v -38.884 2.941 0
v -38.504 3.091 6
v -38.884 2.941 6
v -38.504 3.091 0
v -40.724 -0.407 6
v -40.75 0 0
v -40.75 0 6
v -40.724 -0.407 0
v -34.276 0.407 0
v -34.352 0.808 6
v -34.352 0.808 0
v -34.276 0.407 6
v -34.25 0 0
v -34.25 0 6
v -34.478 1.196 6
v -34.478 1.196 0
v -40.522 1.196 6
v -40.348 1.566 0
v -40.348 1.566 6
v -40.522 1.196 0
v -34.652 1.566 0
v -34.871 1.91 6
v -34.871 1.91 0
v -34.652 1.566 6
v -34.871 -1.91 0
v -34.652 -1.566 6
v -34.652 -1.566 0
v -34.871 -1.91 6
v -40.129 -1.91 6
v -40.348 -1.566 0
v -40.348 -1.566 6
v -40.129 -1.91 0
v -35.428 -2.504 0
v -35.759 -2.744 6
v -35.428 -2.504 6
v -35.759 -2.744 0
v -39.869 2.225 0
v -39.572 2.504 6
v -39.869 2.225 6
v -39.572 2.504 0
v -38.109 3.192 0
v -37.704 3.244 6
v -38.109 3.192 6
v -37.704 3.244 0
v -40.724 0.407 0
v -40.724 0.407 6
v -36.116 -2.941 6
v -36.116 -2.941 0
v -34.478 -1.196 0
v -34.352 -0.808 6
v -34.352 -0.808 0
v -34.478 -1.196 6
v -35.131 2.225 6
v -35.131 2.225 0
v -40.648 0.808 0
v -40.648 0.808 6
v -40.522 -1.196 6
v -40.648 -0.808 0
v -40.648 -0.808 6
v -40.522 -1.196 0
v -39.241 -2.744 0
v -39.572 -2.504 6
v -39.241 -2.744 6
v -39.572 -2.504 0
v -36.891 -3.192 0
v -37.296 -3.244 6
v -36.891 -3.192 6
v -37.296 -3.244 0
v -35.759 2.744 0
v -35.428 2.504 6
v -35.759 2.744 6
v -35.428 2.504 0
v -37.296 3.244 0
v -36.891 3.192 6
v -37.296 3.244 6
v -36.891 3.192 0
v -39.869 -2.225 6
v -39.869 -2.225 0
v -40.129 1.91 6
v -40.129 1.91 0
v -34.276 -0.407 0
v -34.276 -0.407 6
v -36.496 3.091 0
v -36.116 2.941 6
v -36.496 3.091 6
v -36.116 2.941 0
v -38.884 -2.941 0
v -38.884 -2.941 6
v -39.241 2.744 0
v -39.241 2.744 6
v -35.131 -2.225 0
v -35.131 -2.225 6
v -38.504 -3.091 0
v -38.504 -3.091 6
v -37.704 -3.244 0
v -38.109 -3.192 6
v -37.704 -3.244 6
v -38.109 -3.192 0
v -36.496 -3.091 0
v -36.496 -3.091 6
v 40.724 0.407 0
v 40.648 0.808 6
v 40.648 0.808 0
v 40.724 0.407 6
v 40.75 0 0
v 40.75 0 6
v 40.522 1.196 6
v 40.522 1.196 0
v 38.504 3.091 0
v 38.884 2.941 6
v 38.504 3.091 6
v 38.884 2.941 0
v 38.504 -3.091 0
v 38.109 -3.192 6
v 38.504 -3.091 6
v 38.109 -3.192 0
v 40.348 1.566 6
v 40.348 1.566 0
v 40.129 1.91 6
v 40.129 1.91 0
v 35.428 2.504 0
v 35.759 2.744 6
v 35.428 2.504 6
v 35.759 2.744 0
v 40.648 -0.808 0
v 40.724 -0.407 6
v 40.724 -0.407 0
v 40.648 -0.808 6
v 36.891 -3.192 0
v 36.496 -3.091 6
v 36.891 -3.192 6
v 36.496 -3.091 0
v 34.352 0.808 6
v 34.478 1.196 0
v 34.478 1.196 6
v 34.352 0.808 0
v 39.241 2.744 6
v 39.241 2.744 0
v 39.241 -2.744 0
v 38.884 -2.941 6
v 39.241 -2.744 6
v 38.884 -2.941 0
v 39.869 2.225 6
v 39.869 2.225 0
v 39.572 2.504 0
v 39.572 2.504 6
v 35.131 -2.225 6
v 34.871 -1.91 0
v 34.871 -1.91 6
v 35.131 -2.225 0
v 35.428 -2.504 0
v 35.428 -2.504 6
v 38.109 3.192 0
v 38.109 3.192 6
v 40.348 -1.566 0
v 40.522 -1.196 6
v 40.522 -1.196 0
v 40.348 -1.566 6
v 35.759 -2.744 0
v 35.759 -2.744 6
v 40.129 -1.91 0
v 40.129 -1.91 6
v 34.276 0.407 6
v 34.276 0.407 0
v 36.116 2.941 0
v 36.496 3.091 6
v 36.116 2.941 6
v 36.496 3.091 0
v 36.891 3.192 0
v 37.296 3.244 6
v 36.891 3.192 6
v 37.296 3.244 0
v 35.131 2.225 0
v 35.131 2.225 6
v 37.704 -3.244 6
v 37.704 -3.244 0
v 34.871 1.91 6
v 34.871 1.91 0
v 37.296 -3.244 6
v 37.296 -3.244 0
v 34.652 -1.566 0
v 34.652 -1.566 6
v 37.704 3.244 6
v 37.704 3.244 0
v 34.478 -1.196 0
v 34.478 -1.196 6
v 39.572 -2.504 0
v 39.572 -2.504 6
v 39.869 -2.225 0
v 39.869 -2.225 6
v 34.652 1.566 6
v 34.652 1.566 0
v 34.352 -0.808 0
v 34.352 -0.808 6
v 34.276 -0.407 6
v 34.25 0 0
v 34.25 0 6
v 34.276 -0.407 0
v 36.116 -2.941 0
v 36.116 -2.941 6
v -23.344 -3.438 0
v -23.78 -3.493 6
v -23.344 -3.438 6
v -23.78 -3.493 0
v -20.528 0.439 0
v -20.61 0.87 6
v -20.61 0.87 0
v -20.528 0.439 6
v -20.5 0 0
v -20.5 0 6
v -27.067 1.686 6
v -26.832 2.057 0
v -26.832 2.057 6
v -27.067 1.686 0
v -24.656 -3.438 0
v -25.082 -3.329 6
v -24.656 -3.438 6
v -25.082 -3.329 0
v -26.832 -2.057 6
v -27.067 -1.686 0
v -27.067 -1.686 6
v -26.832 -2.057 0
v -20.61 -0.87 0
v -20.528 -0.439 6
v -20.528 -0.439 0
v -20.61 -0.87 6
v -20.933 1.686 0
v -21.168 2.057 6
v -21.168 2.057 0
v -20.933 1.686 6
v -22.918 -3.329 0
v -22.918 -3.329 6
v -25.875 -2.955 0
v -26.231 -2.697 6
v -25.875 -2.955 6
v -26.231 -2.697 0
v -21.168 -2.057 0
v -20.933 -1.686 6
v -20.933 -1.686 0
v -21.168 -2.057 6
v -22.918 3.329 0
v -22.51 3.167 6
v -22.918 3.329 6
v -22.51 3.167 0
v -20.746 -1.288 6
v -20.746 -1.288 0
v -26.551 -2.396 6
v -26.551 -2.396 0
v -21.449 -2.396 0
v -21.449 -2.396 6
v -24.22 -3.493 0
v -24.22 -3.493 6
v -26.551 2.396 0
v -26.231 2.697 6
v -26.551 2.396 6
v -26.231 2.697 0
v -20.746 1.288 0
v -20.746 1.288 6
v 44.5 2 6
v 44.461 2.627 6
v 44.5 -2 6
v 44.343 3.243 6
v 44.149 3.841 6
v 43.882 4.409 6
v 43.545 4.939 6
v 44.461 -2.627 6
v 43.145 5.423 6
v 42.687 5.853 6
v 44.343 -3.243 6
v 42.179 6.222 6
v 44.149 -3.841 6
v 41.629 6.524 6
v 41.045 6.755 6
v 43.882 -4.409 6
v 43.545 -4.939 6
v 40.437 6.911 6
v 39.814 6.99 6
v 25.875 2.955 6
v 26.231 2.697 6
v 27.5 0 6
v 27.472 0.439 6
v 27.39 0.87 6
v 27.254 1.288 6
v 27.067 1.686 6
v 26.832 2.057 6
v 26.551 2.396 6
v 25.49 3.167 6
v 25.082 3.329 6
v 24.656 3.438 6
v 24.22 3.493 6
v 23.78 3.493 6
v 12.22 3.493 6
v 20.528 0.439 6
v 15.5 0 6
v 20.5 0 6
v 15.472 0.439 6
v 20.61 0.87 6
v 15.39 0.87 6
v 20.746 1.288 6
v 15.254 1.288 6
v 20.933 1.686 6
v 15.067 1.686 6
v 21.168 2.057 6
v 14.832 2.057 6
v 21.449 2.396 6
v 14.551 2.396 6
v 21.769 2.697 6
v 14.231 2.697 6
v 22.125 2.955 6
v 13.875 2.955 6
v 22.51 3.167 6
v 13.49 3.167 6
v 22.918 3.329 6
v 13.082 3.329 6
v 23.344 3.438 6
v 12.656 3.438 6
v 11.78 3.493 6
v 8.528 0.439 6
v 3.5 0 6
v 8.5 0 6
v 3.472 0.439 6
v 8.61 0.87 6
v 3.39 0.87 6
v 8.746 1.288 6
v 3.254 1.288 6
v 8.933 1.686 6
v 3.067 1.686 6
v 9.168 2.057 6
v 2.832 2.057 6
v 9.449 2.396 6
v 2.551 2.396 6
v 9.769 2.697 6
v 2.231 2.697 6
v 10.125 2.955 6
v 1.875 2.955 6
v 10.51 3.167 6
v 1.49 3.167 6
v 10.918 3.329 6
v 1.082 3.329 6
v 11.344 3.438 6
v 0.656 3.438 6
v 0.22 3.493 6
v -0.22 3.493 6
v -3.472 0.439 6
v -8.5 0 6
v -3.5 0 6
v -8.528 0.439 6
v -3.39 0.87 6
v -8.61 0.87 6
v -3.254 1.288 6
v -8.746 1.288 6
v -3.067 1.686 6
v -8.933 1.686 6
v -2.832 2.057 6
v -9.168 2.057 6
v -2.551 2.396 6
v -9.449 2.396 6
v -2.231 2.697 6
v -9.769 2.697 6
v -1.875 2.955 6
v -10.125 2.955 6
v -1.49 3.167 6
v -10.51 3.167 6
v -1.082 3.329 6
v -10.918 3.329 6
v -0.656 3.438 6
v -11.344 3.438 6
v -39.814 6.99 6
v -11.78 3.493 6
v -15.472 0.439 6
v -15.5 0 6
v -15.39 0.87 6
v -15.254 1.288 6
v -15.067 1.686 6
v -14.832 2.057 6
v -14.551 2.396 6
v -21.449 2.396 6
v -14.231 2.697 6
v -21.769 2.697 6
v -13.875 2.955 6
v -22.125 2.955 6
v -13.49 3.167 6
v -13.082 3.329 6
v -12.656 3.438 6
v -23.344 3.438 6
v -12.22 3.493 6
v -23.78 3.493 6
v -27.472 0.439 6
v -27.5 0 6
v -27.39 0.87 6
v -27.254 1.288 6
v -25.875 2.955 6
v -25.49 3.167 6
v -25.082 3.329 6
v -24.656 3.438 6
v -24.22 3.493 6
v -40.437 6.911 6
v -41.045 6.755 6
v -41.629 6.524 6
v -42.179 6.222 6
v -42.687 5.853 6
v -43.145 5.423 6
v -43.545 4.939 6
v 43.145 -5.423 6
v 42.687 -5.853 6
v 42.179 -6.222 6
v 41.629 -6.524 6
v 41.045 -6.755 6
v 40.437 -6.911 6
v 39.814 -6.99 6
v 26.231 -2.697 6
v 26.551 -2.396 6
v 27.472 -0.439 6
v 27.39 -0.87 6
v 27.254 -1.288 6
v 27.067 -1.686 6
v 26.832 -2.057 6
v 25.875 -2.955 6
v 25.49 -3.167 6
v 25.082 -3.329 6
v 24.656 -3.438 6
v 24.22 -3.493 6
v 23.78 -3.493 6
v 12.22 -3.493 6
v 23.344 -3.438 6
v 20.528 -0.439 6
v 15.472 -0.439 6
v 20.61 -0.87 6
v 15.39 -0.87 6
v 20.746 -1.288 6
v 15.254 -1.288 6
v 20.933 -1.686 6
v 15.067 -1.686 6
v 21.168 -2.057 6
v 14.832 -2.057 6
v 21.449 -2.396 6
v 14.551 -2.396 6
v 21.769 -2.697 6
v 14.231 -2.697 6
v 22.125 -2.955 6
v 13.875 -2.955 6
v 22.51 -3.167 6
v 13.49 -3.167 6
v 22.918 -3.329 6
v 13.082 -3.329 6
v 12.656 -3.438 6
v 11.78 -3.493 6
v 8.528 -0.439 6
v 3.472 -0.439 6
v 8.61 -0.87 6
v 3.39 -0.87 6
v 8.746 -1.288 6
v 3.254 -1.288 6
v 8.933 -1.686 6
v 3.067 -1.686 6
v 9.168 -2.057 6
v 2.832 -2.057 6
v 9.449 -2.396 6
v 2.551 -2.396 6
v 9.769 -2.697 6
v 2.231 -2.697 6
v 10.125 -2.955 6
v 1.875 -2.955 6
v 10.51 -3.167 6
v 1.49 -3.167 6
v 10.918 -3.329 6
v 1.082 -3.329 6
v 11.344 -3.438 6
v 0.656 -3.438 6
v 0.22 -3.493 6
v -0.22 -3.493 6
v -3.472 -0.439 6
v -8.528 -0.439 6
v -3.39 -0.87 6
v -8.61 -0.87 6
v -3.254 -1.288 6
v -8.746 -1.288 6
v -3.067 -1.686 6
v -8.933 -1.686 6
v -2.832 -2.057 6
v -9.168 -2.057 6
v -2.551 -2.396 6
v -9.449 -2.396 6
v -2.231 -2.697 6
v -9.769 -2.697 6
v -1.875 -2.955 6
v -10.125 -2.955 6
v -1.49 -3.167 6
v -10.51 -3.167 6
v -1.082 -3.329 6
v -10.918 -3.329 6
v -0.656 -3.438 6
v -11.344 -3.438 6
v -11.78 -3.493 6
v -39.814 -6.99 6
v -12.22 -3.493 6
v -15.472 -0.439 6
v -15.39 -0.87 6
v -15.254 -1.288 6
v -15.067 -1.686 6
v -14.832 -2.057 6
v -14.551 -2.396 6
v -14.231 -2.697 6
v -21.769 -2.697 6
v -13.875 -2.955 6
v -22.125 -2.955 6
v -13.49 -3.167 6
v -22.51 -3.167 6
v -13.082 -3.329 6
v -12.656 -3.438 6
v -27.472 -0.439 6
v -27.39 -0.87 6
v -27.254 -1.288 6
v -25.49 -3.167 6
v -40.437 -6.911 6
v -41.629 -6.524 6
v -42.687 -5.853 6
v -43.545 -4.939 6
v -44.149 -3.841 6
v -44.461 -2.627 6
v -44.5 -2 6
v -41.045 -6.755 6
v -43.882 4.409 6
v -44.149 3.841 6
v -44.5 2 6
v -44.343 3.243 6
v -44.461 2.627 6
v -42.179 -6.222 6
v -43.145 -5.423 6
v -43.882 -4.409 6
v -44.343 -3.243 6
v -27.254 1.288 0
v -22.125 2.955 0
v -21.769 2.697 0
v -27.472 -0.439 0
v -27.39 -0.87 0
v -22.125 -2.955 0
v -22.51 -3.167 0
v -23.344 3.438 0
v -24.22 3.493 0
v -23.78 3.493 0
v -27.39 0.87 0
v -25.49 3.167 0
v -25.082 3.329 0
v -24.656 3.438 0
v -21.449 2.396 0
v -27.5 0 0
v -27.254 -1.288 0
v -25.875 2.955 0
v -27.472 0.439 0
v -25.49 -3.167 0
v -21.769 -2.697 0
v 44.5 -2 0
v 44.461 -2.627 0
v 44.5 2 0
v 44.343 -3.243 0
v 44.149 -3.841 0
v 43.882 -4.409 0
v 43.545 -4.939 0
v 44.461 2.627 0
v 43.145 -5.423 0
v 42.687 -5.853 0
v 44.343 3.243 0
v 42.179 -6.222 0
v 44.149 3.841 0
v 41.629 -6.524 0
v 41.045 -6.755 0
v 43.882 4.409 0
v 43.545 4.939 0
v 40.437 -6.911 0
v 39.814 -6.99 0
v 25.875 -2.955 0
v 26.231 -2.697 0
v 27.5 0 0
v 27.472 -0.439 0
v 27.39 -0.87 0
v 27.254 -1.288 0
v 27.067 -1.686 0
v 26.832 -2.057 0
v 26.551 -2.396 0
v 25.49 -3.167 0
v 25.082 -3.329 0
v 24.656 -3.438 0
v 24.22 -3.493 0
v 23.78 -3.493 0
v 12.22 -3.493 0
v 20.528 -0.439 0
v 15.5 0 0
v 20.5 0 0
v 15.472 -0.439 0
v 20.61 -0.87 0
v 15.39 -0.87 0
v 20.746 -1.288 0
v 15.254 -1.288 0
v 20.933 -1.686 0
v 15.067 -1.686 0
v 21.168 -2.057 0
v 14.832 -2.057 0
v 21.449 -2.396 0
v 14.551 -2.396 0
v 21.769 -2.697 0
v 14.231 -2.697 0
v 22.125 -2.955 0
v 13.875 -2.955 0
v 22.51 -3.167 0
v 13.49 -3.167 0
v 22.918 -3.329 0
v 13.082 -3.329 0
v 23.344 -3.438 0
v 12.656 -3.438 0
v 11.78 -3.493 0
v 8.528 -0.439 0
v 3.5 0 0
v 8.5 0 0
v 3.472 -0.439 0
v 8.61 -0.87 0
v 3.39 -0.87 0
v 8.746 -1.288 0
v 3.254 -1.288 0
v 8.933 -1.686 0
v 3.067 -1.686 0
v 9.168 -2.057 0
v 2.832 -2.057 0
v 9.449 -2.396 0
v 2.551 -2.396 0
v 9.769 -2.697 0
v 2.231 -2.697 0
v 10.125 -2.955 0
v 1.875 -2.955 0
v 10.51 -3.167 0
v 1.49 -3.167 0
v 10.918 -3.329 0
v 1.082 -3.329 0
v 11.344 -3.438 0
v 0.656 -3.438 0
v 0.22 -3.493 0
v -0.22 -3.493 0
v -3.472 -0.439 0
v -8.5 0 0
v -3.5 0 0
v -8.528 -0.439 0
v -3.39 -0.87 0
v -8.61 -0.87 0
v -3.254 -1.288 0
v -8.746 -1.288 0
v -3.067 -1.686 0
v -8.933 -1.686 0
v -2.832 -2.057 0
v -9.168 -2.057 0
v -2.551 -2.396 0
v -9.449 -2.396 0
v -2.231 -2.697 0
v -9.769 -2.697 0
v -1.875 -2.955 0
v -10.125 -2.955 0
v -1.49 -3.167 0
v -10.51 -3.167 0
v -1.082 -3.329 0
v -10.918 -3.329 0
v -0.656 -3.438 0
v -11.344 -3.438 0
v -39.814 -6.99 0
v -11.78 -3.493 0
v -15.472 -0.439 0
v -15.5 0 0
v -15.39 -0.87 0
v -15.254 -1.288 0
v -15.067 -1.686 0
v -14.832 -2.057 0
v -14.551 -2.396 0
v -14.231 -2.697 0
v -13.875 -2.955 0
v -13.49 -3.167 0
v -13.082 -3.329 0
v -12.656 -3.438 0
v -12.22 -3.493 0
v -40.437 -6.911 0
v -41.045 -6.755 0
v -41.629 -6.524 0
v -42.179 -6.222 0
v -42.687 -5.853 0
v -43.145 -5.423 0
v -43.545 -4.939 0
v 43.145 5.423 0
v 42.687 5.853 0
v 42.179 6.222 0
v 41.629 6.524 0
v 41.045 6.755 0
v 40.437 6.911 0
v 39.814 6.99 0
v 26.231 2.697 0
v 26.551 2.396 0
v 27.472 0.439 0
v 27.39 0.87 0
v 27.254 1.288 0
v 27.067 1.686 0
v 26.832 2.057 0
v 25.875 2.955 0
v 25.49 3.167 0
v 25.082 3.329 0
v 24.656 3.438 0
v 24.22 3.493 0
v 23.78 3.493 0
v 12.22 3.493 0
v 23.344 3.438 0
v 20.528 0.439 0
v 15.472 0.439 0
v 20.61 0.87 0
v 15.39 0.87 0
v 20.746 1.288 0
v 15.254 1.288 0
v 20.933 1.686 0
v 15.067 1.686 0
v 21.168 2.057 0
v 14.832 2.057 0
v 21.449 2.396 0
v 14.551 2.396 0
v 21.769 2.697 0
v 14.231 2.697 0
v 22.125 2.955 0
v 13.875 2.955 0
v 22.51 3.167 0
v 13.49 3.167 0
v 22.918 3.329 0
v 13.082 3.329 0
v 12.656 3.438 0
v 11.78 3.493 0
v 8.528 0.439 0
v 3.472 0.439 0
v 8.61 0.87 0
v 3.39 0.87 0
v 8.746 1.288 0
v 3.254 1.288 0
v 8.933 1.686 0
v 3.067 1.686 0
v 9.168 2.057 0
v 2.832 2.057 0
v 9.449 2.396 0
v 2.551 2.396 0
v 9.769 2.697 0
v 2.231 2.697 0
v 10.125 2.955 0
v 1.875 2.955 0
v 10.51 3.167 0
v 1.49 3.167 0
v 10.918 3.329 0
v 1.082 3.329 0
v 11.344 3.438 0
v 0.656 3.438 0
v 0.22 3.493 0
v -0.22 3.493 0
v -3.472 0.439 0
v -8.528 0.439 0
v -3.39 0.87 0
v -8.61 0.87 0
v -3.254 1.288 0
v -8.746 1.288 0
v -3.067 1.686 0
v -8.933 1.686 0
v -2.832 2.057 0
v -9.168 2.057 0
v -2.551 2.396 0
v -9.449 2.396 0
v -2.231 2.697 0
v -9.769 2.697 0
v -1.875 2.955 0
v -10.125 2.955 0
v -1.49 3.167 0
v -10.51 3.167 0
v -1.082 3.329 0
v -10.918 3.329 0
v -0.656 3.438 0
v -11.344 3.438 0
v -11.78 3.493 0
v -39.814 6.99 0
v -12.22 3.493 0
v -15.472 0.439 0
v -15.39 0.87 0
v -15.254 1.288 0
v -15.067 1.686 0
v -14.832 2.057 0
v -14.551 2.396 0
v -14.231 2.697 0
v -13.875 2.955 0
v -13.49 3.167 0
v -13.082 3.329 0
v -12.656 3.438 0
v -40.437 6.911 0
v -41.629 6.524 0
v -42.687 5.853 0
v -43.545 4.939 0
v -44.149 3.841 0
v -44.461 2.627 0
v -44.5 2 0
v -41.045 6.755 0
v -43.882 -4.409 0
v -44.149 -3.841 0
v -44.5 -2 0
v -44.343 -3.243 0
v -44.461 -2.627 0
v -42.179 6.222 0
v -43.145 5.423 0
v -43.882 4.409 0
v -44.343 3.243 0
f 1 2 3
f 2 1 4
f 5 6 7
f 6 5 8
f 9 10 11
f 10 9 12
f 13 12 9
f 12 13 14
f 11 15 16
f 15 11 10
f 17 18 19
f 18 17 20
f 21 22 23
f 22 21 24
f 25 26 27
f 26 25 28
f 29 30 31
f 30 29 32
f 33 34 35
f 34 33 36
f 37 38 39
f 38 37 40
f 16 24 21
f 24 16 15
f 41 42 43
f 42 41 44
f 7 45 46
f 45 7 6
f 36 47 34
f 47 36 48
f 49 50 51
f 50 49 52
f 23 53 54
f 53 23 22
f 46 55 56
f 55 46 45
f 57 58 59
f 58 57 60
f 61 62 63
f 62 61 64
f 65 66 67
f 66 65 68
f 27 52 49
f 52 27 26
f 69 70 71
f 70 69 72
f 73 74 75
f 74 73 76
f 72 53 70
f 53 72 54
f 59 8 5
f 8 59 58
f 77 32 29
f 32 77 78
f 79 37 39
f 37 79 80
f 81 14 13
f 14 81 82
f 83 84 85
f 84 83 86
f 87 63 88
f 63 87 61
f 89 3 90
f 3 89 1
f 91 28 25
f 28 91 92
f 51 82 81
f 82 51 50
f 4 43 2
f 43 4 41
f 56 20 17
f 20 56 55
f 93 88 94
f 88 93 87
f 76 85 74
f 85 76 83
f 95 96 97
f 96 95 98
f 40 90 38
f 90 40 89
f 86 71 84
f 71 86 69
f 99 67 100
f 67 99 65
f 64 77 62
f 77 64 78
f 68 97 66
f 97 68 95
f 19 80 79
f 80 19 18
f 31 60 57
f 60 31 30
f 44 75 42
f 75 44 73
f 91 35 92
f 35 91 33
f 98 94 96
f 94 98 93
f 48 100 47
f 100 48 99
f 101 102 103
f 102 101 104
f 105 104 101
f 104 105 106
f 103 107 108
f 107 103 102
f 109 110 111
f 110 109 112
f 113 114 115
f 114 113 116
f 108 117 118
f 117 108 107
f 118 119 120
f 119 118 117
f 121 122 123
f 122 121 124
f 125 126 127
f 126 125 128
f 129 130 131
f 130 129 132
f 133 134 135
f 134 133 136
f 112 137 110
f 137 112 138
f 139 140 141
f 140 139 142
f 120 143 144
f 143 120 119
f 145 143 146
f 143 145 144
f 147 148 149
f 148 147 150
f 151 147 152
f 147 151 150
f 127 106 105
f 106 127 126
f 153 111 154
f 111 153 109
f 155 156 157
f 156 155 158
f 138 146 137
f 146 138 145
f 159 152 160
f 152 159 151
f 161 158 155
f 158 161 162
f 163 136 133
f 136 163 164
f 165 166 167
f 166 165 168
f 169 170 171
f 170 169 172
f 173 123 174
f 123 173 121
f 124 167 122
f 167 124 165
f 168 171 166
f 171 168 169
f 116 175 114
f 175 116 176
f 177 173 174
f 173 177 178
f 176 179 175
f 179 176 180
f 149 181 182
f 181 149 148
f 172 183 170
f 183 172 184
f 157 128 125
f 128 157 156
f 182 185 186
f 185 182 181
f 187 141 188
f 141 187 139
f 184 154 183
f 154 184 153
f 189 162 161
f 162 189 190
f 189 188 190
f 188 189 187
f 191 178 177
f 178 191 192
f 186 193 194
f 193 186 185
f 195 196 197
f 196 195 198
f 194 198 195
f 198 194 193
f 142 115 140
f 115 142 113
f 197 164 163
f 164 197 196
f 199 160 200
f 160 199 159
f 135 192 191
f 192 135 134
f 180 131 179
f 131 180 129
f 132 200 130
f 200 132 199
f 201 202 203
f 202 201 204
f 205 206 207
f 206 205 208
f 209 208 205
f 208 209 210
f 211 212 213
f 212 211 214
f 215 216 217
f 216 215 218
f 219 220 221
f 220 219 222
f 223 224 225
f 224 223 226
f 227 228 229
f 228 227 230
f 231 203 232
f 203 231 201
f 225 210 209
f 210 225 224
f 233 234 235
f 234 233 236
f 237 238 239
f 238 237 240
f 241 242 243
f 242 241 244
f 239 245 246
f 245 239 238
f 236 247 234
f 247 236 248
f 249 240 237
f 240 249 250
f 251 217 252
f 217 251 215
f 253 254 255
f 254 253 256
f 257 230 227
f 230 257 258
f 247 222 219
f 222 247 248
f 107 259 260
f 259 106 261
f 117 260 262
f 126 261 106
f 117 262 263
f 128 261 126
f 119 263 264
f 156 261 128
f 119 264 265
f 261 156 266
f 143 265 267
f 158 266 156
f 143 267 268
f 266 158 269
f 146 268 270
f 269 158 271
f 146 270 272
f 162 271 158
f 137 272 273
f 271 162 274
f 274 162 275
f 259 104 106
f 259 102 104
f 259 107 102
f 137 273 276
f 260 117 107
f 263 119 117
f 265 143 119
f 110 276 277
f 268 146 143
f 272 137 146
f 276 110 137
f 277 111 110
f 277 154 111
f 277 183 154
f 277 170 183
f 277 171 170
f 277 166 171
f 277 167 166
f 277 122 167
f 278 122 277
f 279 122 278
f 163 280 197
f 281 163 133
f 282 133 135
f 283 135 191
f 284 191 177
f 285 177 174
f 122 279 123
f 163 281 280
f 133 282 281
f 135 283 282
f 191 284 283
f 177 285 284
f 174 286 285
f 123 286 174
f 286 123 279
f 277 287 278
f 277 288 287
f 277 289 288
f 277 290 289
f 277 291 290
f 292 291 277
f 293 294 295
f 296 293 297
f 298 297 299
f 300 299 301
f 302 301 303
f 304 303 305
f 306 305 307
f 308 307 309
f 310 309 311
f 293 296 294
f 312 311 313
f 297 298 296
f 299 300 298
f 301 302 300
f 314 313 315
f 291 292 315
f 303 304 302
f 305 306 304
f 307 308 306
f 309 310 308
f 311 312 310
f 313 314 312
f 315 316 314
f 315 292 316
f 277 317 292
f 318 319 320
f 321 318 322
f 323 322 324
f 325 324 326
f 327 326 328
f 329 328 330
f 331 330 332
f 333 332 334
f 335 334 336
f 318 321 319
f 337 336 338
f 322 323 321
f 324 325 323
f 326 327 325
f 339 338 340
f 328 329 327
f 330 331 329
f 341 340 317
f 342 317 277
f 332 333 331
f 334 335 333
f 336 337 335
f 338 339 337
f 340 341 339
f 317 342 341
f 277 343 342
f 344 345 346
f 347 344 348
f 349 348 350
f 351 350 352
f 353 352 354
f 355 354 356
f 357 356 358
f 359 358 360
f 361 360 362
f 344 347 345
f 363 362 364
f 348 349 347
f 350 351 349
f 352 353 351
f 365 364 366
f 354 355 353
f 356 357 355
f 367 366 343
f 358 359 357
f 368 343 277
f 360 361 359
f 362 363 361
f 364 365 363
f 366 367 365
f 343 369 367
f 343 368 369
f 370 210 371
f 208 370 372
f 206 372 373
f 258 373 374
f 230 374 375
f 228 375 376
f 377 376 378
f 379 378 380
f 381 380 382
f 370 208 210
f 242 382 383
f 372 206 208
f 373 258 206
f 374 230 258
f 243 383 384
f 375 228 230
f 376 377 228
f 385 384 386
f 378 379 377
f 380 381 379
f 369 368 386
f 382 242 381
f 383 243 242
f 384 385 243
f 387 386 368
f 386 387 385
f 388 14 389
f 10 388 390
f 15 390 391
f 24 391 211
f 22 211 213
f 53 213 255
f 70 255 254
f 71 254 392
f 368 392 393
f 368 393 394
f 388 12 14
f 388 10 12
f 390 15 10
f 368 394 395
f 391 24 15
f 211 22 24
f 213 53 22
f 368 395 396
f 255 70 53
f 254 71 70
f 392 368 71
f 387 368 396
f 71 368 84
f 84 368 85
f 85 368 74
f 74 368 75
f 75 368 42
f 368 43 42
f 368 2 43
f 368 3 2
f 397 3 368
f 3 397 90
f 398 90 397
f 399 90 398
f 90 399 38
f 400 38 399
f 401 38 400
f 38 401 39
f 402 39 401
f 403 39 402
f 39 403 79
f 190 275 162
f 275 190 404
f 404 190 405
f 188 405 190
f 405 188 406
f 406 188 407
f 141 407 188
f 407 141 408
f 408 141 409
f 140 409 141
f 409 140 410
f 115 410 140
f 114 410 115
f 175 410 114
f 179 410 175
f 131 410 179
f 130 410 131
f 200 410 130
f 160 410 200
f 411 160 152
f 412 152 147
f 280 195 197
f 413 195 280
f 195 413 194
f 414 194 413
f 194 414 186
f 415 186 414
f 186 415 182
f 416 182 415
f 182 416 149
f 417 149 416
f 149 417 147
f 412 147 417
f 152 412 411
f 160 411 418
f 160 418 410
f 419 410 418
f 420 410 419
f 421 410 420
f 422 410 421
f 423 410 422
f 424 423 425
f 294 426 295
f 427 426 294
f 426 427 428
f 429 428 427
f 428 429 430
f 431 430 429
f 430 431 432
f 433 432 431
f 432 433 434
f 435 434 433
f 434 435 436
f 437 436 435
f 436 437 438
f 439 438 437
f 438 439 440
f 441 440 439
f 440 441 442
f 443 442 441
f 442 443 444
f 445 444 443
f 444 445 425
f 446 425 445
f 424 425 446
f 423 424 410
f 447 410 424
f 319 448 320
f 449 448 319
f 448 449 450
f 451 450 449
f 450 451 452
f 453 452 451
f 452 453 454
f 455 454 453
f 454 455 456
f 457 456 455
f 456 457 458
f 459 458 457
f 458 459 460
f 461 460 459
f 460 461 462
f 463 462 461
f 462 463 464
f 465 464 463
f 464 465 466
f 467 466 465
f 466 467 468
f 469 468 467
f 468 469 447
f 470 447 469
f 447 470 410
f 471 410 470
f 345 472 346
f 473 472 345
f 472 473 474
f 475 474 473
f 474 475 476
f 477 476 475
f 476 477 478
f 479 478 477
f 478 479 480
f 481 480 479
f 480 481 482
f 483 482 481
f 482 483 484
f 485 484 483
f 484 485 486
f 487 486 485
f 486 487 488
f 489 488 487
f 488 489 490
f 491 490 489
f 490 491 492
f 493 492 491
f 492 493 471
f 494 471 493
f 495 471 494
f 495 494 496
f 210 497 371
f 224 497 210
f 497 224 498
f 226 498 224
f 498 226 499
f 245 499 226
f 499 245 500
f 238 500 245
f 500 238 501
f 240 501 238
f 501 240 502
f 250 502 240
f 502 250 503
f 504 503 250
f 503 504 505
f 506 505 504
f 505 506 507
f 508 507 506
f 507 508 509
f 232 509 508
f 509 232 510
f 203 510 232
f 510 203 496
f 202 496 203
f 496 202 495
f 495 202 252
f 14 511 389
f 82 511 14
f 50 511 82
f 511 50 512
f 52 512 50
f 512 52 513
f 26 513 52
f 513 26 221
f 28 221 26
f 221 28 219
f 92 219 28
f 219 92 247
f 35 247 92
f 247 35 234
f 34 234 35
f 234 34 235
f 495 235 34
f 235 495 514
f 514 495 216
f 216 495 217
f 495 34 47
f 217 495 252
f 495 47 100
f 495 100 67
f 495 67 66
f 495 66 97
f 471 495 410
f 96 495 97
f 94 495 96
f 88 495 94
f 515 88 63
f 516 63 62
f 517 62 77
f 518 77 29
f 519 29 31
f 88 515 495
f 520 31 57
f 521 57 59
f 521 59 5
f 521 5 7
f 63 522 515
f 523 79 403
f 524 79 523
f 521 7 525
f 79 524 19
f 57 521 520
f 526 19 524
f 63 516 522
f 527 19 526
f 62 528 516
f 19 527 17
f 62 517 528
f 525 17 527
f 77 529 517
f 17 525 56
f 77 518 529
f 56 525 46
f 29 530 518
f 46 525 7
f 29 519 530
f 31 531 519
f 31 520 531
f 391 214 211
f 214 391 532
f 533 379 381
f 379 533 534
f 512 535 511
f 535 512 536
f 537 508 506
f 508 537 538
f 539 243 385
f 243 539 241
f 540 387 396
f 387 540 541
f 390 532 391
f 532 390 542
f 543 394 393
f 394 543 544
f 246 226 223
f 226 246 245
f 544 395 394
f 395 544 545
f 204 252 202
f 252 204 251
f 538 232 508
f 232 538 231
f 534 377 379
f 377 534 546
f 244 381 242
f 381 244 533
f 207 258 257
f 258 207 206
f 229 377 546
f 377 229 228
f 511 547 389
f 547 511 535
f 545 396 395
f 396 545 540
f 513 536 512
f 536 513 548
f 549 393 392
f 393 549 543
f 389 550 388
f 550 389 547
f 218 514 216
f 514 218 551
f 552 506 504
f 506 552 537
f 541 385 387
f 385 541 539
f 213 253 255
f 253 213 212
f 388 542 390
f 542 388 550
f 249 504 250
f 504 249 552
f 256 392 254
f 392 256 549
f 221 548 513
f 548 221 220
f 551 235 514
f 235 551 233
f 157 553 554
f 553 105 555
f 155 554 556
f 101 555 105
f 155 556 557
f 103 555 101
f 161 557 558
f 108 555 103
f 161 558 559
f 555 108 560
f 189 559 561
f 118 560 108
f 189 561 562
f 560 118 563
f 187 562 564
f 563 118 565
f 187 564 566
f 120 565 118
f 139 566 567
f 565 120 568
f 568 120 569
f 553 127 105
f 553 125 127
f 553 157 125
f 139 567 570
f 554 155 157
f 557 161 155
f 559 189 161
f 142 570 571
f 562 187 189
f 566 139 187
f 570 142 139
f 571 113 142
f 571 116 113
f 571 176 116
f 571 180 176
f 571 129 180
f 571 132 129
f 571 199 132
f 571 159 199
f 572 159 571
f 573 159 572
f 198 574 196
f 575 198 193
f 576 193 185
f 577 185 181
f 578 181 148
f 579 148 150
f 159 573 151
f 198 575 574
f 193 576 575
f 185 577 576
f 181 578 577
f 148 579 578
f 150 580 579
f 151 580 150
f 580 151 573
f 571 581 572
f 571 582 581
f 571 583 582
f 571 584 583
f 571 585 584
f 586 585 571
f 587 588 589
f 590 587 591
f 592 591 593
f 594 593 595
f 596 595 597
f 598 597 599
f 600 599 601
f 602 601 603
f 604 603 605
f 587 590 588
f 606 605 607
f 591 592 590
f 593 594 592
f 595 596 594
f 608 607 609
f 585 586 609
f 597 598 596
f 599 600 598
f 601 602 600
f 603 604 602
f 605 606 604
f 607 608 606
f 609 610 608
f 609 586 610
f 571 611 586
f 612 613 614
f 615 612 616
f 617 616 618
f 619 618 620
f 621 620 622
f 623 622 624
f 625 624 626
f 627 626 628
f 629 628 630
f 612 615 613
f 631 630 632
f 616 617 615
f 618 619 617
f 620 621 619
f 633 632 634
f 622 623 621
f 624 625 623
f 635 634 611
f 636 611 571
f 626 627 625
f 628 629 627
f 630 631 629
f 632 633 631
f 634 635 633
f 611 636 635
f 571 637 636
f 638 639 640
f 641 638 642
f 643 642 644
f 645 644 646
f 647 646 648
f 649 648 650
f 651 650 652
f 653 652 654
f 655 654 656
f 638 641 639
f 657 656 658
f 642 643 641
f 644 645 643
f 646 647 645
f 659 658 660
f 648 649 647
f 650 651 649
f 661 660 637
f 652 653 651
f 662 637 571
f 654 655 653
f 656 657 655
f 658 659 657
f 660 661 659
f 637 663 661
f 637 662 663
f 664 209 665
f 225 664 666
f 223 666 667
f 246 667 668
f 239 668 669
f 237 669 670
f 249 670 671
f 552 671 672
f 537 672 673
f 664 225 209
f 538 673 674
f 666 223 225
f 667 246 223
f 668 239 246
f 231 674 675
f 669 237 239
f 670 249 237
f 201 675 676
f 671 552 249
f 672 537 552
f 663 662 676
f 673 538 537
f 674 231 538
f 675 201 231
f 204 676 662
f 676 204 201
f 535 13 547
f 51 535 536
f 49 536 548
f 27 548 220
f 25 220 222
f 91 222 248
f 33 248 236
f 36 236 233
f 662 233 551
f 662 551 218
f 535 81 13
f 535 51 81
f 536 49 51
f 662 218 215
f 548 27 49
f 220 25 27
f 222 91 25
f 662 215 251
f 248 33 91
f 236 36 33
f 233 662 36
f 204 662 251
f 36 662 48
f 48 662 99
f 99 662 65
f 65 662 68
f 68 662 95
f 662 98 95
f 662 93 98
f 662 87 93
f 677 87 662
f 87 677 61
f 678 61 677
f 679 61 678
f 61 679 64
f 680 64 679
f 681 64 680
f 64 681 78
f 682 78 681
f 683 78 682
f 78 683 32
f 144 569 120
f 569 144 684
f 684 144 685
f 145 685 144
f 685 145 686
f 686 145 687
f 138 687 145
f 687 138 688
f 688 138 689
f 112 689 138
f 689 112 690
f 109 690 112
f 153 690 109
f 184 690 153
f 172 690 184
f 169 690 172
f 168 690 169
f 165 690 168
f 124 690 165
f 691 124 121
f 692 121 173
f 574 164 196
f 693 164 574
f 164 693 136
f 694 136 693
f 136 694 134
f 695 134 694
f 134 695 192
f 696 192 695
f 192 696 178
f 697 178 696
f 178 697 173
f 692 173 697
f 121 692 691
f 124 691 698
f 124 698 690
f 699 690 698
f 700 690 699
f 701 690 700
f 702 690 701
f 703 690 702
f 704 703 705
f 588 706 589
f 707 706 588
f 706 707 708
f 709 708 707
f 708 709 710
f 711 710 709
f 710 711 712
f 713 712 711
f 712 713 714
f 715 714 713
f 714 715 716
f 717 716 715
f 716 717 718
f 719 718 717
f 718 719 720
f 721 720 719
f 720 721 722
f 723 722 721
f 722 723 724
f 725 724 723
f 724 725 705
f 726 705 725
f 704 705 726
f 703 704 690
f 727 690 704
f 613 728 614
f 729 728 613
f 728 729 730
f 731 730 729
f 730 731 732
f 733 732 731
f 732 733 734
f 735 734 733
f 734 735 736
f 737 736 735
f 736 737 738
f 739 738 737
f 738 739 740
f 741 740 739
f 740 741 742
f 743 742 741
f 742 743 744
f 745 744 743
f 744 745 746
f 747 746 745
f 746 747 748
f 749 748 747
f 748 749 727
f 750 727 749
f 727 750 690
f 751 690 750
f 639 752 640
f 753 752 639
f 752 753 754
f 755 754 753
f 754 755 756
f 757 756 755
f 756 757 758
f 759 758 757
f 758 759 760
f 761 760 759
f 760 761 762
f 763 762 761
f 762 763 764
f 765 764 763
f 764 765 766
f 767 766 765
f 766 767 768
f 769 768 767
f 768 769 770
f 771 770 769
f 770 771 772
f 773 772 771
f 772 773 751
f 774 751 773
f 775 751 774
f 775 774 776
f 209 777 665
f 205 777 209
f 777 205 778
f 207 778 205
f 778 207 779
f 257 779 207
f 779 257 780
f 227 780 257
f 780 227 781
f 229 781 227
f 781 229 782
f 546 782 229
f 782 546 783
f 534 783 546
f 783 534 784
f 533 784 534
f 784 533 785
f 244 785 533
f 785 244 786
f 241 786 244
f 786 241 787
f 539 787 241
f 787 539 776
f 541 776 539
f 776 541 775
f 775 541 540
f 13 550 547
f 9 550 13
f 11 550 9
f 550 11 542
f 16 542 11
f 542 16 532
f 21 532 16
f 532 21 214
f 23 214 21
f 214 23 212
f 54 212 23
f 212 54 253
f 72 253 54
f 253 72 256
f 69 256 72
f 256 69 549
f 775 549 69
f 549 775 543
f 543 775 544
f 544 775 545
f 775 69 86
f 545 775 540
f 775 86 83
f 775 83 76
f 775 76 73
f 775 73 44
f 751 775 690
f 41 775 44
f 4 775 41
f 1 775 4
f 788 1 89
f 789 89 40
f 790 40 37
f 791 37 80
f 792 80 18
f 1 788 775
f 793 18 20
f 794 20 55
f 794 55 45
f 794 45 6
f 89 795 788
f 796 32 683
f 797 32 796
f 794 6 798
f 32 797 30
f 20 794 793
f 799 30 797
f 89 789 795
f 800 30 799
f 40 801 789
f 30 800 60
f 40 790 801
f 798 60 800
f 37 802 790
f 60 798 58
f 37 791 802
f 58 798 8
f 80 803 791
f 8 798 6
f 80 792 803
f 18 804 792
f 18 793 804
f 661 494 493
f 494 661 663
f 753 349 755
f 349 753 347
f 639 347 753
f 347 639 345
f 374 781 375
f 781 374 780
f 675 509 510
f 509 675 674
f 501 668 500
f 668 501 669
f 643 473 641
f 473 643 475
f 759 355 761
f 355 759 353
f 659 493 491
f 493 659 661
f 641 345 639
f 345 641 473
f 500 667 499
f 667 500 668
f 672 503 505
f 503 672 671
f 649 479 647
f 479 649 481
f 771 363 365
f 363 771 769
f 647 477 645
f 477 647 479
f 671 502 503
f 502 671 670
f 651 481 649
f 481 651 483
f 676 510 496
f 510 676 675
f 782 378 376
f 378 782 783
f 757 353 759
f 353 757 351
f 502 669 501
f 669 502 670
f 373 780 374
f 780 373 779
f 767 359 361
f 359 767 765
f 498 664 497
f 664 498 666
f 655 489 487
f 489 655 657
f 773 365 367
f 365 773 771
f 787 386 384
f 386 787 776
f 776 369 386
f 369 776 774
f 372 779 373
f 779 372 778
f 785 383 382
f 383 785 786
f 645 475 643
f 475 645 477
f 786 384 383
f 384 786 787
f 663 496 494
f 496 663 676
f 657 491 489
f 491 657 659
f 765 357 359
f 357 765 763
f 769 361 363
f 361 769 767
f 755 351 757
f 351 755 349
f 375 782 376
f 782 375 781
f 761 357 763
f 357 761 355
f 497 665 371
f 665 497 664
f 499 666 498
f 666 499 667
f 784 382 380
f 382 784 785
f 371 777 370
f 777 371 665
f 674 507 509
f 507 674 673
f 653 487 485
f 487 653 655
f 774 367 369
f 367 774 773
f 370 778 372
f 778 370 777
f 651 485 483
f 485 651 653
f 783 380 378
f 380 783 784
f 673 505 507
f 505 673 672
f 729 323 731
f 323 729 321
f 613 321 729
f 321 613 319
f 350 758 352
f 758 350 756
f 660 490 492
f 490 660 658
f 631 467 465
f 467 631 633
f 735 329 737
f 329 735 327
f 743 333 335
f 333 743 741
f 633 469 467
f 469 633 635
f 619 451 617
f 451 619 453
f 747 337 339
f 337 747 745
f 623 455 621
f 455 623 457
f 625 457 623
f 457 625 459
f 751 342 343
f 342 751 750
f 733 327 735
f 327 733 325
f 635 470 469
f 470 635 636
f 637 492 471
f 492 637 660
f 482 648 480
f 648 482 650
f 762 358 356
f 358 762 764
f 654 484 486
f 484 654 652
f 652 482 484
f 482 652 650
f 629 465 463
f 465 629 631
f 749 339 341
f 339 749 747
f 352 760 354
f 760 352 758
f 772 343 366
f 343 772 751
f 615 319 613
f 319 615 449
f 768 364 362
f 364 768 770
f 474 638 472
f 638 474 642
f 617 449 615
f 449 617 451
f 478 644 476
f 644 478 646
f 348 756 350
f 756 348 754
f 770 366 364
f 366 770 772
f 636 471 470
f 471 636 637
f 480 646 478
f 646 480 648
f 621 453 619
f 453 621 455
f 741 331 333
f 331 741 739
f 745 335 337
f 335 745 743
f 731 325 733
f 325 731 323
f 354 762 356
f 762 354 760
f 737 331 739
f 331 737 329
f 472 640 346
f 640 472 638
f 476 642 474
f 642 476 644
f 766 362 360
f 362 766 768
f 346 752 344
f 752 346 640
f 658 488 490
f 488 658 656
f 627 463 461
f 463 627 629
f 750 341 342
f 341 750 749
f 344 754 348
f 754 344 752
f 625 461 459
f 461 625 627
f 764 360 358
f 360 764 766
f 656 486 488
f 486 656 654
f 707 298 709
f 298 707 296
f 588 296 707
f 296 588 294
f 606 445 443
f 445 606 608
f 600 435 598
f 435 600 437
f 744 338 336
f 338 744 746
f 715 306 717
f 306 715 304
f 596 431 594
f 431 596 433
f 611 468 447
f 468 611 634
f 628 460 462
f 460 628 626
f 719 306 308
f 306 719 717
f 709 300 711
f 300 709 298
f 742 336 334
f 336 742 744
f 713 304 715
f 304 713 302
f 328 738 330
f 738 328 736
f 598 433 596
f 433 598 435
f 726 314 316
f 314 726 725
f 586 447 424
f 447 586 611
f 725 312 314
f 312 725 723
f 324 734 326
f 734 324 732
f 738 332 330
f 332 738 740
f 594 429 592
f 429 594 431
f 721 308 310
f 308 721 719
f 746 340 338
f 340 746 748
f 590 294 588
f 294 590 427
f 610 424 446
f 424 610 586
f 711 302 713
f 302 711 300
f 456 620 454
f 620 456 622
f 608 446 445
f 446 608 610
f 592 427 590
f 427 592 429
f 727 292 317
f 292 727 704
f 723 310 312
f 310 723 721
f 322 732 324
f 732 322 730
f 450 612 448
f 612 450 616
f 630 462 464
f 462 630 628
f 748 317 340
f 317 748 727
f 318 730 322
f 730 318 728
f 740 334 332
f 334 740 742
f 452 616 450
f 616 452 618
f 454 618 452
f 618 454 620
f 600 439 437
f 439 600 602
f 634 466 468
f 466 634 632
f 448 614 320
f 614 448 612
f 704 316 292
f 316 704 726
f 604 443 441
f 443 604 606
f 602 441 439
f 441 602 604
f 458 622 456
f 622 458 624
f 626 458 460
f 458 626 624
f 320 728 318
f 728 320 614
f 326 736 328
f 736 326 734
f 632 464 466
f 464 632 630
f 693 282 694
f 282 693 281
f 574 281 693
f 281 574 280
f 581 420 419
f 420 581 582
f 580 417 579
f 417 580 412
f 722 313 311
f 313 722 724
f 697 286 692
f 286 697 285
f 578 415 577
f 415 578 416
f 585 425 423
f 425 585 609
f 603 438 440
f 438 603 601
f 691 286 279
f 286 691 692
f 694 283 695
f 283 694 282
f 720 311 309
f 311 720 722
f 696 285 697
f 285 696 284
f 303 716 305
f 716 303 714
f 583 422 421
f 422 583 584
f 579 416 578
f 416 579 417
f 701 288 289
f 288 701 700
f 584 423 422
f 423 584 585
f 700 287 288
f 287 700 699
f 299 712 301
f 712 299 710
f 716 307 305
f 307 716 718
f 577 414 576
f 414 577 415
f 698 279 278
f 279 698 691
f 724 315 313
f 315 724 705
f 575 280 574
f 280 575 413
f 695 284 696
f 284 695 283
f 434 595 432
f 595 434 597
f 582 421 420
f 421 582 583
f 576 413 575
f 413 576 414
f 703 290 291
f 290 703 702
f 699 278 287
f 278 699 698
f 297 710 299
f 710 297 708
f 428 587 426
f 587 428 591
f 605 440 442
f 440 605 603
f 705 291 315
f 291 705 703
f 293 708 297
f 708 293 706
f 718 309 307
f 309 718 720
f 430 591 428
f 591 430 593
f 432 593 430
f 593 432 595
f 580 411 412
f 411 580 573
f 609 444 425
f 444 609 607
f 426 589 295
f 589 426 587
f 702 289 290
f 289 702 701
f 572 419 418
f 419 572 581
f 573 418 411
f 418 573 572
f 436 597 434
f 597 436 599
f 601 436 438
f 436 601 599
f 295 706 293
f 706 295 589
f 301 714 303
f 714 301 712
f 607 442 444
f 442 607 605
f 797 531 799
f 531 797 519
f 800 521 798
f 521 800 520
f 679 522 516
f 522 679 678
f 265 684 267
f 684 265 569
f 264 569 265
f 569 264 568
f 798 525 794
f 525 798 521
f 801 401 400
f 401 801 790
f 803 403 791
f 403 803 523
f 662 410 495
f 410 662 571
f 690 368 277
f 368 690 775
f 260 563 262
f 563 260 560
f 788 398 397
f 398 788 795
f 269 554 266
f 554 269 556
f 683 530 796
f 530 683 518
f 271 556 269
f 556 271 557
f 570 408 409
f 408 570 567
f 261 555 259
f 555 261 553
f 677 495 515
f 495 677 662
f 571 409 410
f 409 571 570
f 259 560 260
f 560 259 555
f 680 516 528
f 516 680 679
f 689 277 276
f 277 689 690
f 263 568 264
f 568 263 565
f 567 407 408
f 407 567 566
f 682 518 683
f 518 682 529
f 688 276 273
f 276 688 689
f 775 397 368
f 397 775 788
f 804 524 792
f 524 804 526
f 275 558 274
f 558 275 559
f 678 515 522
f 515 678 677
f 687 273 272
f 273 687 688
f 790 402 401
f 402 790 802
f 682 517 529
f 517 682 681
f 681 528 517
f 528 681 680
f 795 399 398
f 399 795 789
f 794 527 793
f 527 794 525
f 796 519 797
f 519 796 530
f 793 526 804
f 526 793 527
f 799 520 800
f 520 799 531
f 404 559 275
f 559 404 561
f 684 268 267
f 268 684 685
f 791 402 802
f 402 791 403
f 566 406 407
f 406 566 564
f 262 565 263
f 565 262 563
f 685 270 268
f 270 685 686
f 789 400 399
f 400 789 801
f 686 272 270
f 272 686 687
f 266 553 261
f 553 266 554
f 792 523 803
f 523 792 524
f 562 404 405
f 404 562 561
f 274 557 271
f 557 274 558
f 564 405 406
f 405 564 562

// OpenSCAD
$fn = 50;


difference() {
	union() {
		hull() {
			translate(v = [-39.5000000000, 2.0000000000, 0]) {
				cylinder(h = 6, r = 5);
			}
			translate(v = [39.5000000000, 2.0000000000, 0]) {
				cylinder(h = 6, r = 5);
			}
			translate(v = [-39.5000000000, -2.0000000000, 0]) {
				cylinder(h = 6, r = 5);
			}
			translate(v = [39.5000000000, -2.0000000000, 0]) {
				cylinder(h = 6, r = 5);
			}
		}
	}
	union() {
		#translate(v = [-37.5000000000, 0.0000000000, 0]) {
			cylinder(h = 6, r = 3.2500000000);
		}
		#translate(v = [37.5000000000, 0.0000000000, 0]) {
			cylinder(h = 6, r = 3.2500000000);
		}
		#translate(v = [-37.5000000000, 0.0000000000, -100.0000000000]) {
			cylinder(h = 200, r = 3.2500000000);
		}
		#translate(v = [-37.5000000000, 0.0000000000, -100.0000000000]) {
			cylinder(h = 200, r = 3.2500000000);
		}
		#translate(v = [37.5000000000, 0.0000000000, -100.0000000000]) {
			cylinder(h = 200, r = 3.2500000000);
		}
		#translate(v = [37.5000000000, 0.0000000000, -100.0000000000]) {
			cylinder(h = 200, r = 3.2500000000);
		}
		#translate(v = [-37.5000000000, 0.0000000000, 0]) {
			cylinder(h = 6, r = 1.8000000000);
		}
		#translate(v = [37.5000000000, 0.0000000000, 0]) {
			cylinder(h = 6, r = 1.8000000000);
		}
		#translate(v = [-37.5000000000, 0.0000000000, 0]) {
			cylinder(h = 6, r = 1.8000000000);
		}
		#translate(v = [37.5000000000, 0.0000000000, 0]) {
			cylinder(h = 6, r = 1.8000000000);
		}
		#translate(v = [-37.5000000000, 0.0000000000, 0]) {
			cylinder(h = 6, r = 1.8000000000);
		}
		#translate(v = [37.5000000000, 0.0000000000, 0]) {
			cylinder(h = 6, r = 1.8000000000);
		}
		#translate(v = [-24.0000000000, 0, 0]) {
			cylinder(h = 6, r = 3.5000000000);
		}
		#translate(v = [-12.0000000000, 0, 0]) {
			cylinder(h = 6, r = 3.5000000000);
		}
		#cylinder(h = 6, r = 3.5000000000);
		#translate(v = [12.0000000000, 0, 0]) {
			cylinder(h = 6, r = 3.5000000000);
		}
		#translate(v = [24.0000000000, 0, 0]) {
			cylinder(h = 6, r = 3.5000000000);
		}
	}
}
